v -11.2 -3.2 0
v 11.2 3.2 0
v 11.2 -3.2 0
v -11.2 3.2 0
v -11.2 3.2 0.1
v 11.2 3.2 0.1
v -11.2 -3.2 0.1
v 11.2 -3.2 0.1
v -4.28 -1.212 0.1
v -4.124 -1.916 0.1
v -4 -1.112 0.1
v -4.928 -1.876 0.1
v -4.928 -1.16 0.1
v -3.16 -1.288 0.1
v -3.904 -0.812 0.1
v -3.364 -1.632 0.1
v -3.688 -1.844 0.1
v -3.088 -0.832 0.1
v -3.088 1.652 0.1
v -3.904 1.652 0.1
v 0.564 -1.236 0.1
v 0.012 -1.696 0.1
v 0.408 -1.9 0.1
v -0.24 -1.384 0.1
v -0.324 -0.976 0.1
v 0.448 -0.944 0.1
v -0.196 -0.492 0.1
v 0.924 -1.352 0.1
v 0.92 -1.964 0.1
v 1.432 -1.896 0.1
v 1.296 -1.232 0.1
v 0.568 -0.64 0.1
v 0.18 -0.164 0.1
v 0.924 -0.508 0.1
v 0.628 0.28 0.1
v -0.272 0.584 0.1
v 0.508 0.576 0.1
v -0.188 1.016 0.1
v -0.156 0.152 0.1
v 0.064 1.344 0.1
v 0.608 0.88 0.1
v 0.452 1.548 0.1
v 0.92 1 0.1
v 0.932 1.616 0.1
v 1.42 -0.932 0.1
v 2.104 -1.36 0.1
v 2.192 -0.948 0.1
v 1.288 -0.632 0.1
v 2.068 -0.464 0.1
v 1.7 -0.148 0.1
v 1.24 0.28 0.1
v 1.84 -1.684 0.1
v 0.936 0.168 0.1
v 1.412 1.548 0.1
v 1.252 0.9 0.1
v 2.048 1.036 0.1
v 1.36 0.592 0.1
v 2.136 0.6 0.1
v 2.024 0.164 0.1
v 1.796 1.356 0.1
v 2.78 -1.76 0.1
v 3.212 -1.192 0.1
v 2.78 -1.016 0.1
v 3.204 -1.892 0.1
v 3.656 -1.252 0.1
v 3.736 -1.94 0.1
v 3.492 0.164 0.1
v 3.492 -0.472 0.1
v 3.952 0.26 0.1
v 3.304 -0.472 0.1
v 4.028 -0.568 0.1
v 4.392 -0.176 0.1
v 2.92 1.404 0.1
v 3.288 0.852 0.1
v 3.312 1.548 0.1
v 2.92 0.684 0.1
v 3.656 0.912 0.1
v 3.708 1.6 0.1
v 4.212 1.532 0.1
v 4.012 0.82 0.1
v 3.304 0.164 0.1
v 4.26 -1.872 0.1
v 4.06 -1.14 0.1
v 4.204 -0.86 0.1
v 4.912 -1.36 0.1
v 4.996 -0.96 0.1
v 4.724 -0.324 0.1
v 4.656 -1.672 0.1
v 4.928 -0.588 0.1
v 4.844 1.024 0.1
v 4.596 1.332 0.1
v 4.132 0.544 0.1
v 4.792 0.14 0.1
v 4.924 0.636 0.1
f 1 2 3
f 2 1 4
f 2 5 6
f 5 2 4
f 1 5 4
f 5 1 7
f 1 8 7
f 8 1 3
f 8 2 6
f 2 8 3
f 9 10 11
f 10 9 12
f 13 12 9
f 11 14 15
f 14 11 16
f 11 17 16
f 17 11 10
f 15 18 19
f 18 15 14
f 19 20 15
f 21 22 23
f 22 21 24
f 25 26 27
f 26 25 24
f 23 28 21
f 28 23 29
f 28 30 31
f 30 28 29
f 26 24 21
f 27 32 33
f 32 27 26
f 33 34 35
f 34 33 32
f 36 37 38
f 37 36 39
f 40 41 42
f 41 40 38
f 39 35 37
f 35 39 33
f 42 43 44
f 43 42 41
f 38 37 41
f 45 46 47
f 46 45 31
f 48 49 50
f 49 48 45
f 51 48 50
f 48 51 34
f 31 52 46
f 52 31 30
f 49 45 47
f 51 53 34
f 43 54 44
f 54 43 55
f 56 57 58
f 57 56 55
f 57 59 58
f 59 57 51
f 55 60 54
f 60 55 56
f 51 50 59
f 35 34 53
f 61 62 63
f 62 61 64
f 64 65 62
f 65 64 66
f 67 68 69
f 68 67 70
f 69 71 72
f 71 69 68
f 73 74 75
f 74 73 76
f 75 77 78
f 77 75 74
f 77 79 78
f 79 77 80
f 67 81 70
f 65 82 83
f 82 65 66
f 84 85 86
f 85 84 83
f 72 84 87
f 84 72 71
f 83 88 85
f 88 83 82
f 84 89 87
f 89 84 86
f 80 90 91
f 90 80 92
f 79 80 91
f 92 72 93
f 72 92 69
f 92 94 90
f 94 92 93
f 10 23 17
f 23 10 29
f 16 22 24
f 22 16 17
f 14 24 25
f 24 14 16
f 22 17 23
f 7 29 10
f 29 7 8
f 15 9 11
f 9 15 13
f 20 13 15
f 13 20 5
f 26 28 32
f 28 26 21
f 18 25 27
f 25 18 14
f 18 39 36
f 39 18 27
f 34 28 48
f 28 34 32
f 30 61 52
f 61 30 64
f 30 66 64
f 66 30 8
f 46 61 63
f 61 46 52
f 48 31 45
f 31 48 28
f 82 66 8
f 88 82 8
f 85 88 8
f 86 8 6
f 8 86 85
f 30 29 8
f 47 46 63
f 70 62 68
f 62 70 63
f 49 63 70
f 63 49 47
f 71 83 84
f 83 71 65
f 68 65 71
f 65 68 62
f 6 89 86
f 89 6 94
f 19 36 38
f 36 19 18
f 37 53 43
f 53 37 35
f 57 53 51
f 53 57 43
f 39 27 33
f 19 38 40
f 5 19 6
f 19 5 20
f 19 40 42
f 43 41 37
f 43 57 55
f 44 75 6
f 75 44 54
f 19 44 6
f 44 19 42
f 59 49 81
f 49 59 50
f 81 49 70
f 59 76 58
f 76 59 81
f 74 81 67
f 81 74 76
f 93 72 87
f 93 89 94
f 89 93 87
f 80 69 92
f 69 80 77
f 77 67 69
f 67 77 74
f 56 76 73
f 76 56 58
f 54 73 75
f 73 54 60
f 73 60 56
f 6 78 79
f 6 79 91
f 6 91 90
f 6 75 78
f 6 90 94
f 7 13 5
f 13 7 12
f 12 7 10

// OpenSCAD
// file: ../p/box5-12.scad
use <../lib.scad>
function ldraw_lib__box5_12() = [
// 0 Box with 5 Faces without Any Edges
// 0 Name: box5-12.dat
// 0 Author: Chris Dee [cwdee]
// 0 !LDRAW_ORG Primitive UPDATE 2009-02
// 0 !LICENSE Licensed under CC BY 2.0 and CC BY 4.0 : see CAreadme.txt
// 
// 0 BFC CERTIFY CCW
  [0,"BFC","CERTIFY"],
  [0,"BFC","CCW"],
// 
// 0 !HISTORY 2009-09-03 [PTadmin] Official Update 2009-02
// 
// 
// 4 16 1 1 1 1 1 -1 -1 1 -1 -1 1 1
  [4,16,1,1,1,1,1,-1,-1,1,-1,-1,1,1],
// 4 16 -1 0 1 1 0 1 1 1 1 -1 1 1
  [4,16,-1,0,1,1,0,1,1,1,1,-1,1,1],
// 4 16 -1 0 -1 -1 0 1 -1 1 1 -1 1 -1
  [4,16,-1,0,-1,-1,0,1,-1,1,1,-1,1,-1],
// 4 16 1 0 -1 -1 0 -1 -1 1 -1 1 1 -1
  [4,16,1,0,-1,-1,0,-1,-1,1,-1,1,1,-1],
// 4 16 1 0 1 1 0 -1 1 1 -1 1 1 1
  [4,16,1,0,1,1,0,-1,1,1,-1,1,1,1],
// 0
];
makepoly(ldraw_lib__box5_12(), line=0.2);
// main file
use <../lib.scad>
use <../p/box5-12.scad>
function ldraw_lib__6153754l() = [
// 0 Sticker  0.8 x  2.8 with Black "J 83" on Transparent Background
// 0 Name: 6153754l.dat
// 0 Author: Magnus Forsberg [MagFors]
// 0 !LDRAW_ORG Part UPDATE 2016-01
// 0 !LICENSE Licensed under CC BY 2.0 and CC BY 4.0 : see CAreadme.txt
// 
// 0 BFC CERTIFY CCW
  [0,"BFC","CERTIFY"],
  [0,"BFC","CCW"],
// 
// 0 !KEYWORDS Beetle, set 10252, Volkswagen, VW
// 
// 0 !HISTORY 2016-12-31 [PTadmin] Official Update 2016-01
// 
// 
// 1 16 0 -0.25 0 28 0 0 0 0.25 0 0 0 8 box5-12.dat
  [1,16,0,-0.25,0,28,0,0,0,0.25,0,0,0,8, ldraw_lib__box5_12()],
// 4 0 -10.7 -0.25 -3.03 -12.32 -0.25 -4.69 -10.31 -0.25 -4.79 -10 -0.25 -2.78
  [4,0,-10.7,-0.25,-3.03,-12.32,-0.25,-4.69,-10.31,-0.25,-4.79,-10,-0.25,-2.78],
// 3 0 -12.32 -0.25 -2.9 -12.32 -0.25 -4.69 -10.7 -0.25 -3.03
  [3,0,-12.32,-0.25,-2.9,-12.32,-0.25,-4.69,-10.7,-0.25,-3.03],
// 4 0 -7.9 -0.25 -3.22 -9.76 -0.25 -2.03 -10 -0.25 -2.78 -8.41 -0.25 -4.08
  [4,0,-7.9,-0.25,-3.22,-9.76,-0.25,-2.03,-10,-0.25,-2.78,-8.41,-0.25,-4.08],
// 4 0 -10 -0.25 -2.78 -10.31 -0.25 -4.79 -9.22 -0.25 -4.61 -8.41 -0.25 -4.08
  [4,0,-10,-0.25,-2.78,-10.31,-0.25,-4.79,-9.22,-0.25,-4.61,-8.41,-0.25,-4.08],
// 4 0 -9.76 -0.25 -2.03 -7.9 -0.25 -3.22 -7.72 -0.25 -2.08 -7.72 -0.25 4.13
  [4,0,-9.76,-0.25,-2.03,-7.9,-0.25,-3.22,-7.72,-0.25,-2.08,-7.72,-0.25,4.13],
// 3 0 -7.72 -0.25 4.13 -9.76 -0.25 4.13 -9.76 -0.25 -2.03
  [3,0,-7.72,-0.25,4.13,-9.76,-0.25,4.13,-9.76,-0.25,-2.03],
// 4 0 1.41 -0.25 -3.09 -0.6 -0.25 -3.46 0.03 -0.25 -4.24 1.02 -0.25 -4.75
  [4,0,1.41,-0.25,-3.09,-0.6,-0.25,-3.46,0.03,-0.25,-4.24,1.02,-0.25,-4.75],
// 4 0 -0.81 -0.25 -2.44 -0.6 -0.25 -3.46 1.12 -0.25 -2.36 -0.49 -0.25 -1.23
  [4,0,-0.81,-0.25,-2.44,-0.6,-0.25,-3.46,1.12,-0.25,-2.36,-0.49,-0.25,-1.23],
// 4 0 2.31 -0.25 -3.38 1.41 -0.25 -3.09 1.02 -0.25 -4.75 2.3 -0.25 -4.91
  [4,0,2.31,-0.25,-3.38,1.41,-0.25,-3.09,1.02,-0.25,-4.75,2.3,-0.25,-4.91],
// 4 0 2.31 -0.25 -3.38 2.3 -0.25 -4.91 3.58 -0.25 -4.74 3.24 -0.25 -3.08
  [4,0,2.31,-0.25,-3.38,2.3,-0.25,-4.91,3.58,-0.25,-4.74,3.24,-0.25,-3.08],
// 3 0 1.12 -0.25 -2.36 -0.6 -0.25 -3.46 1.41 -0.25 -3.09
  [3,0,1.12,-0.25,-2.36,-0.6,-0.25,-3.46,1.41,-0.25,-3.09],
// 4 0 -0.49 -0.25 -1.23 1.12 -0.25 -2.36 1.42 -0.25 -1.6 0.45 -0.25 -0.41
  [4,0,-0.49,-0.25,-1.23,1.12,-0.25,-2.36,1.42,-0.25,-1.6,0.45,-0.25,-0.41],
// 4 0 0.45 -0.25 -0.41 1.42 -0.25 -1.6 2.31 -0.25 -1.27 1.57 -0.25 0.7
  [4,0,0.45,-0.25,-0.41,1.42,-0.25,-1.6,2.31,-0.25,-1.27,1.57,-0.25,0.7],
// 4 0 -0.68 -0.25 1.46 -0.39 -0.25 0.38 1.27 -0.25 1.44 -0.47 -0.25 2.54
  [4,0,-0.68,-0.25,1.46,-0.39,-0.25,0.38,1.27,-0.25,1.44,-0.47,-0.25,2.54],
// 4 0 0.16 -0.25 3.36 -0.47 -0.25 2.54 1.52 -0.25 2.2 1.13 -0.25 3.87
  [4,0,0.16,-0.25,3.36,-0.47,-0.25,2.54,1.52,-0.25,2.2,1.13,-0.25,3.87],
// 4 0 -0.39 -0.25 0.38 0.45 -0.25 -0.41 1.57 -0.25 0.7 1.27 -0.25 1.44
  [4,0,-0.39,-0.25,0.38,0.45,-0.25,-0.41,1.57,-0.25,0.7,1.27,-0.25,1.44],
// 4 0 1.13 -0.25 3.87 1.52 -0.25 2.2 2.3 -0.25 2.5 2.33 -0.25 4.04
  [4,0,1.13,-0.25,3.87,1.52,-0.25,2.2,2.3,-0.25,2.5,2.33,-0.25,4.04],
// 3 0 -0.47 -0.25 2.54 1.27 -0.25 1.44 1.52 -0.25 2.2
  [3,0,-0.47,-0.25,2.54,1.27,-0.25,1.44,1.52,-0.25,2.2],
// 4 0 3.55 -0.25 -2.33 3.24 -0.25 -3.08 5.26 -0.25 -3.4 5.48 -0.25 -2.37
  [4,0,3.55,-0.25,-2.33,3.24,-0.25,-3.08,5.26,-0.25,-3.4,5.48,-0.25,-2.37],
// 4 0 3.22 -0.25 -1.58 3.55 -0.25 -2.33 5.17 -0.25 -1.16 4.25 -0.25 -0.37
  [4,0,3.22,-0.25,-1.58,3.55,-0.25,-2.33,5.17,-0.25,-1.16,4.25,-0.25,-0.37],
// 4 0 3.1 -0.25 0.7 2.31 -0.25 -1.27 3.22 -0.25 -1.58 4.25 -0.25 -0.37
  [4,0,3.1,-0.25,0.7,2.31,-0.25,-1.27,3.22,-0.25,-1.58,4.25,-0.25,-0.37],
// 4 0 3.24 -0.25 -3.08 3.58 -0.25 -4.74 4.6 -0.25 -4.21 5.26 -0.25 -3.4
  [4,0,3.24,-0.25,-3.08,3.58,-0.25,-4.74,4.6,-0.25,-4.21,5.26,-0.25,-3.4],
// 3 0 5.17 -0.25 -1.16 3.55 -0.25 -2.33 5.48 -0.25 -2.37
  [3,0,5.17,-0.25,-1.16,3.55,-0.25,-2.33,5.48,-0.25,-2.37],
// 3 0 3.1 -0.25 0.7 2.34 -0.25 0.42 2.31 -0.25 -1.27
  [3,0,3.1,-0.25,0.7,2.34,-0.25,0.42,2.31,-0.25,-1.27],
// 4 0 2.3 -0.25 2.5 3.13 -0.25 2.25 3.53 -0.25 3.87 2.33 -0.25 4.04
  [4,0,2.3,-0.25,2.5,3.13,-0.25,2.25,3.53,-0.25,3.87,2.33,-0.25,4.04],
// 4 0 5.12 -0.25 2.59 3.13 -0.25 2.25 3.4 -0.25 1.48 5.34 -0.25 1.5
  [4,0,5.12,-0.25,2.59,3.13,-0.25,2.25,3.4,-0.25,1.48,5.34,-0.25,1.5],
// 4 0 3.4 -0.25 1.48 3.1 -0.25 0.7 5.06 -0.25 0.41 5.34 -0.25 1.5
  [4,0,3.4,-0.25,1.48,3.1,-0.25,0.7,5.06,-0.25,0.41,5.34,-0.25,1.5],
// 4 0 4.49 -0.25 3.39 3.53 -0.25 3.87 3.13 -0.25 2.25 5.12 -0.25 2.59
  [4,0,4.49,-0.25,3.39,3.53,-0.25,3.87,3.13,-0.25,2.25,5.12,-0.25,2.59],
// 3 0 3.1 -0.25 0.7 4.25 -0.25 -0.37 5.06 -0.25 0.41
  [3,0,3.1,-0.25,0.7,4.25,-0.25,-0.37,5.06,-0.25,0.41],
// 3 0 1.57 -0.25 0.7 2.31 -0.25 -1.27 2.34 -0.25 0.42
  [3,0,1.57,-0.25,0.7,2.31,-0.25,-1.27,2.34,-0.25,0.42],
// 4 0 6.95 -0.25 -4.4 8.01 -0.25 -4.73 8.03 -0.25 -2.98 6.95 -0.25 -2.54
  [4,0,6.95,-0.25,-4.4,8.01,-0.25,-4.73,8.03,-0.25,-2.98,6.95,-0.25,-2.54],
// 4 0 9.14 -0.25 -3.13 8.03 -0.25 -2.98 8.01 -0.25 -4.73 9.34 -0.25 -4.85
  [4,0,9.14,-0.25,-3.13,8.03,-0.25,-2.98,8.01,-0.25,-4.73,9.34,-0.25,-4.85],
// 4 0 8.73 -0.25 0.41 8.26 -0.25 -1.18 8.73 -0.25 -1.18 9.88 -0.25 0.65
  [4,0,8.73,-0.25,0.41,8.26,-0.25,-1.18,8.73,-0.25,-1.18,9.88,-0.25,0.65],
// 4 0 9.88 -0.25 0.65 8.73 -0.25 -1.18 10.07 -0.25 -1.42 10.98 -0.25 -0.44
  [4,0,9.88,-0.25,0.65,8.73,-0.25,-1.18,10.07,-0.25,-1.42,10.98,-0.25,-0.44],
// 4 0 8.22 -0.25 2.13 8.28 -0.25 3.87 7.3 -0.25 3.51 7.3 -0.25 1.71
  [4,0,8.22,-0.25,2.13,8.28,-0.25,3.87,7.3,-0.25,3.51,7.3,-0.25,1.71],
// 4 0 9.14 -0.25 2.28 9.27 -0.25 4 8.28 -0.25 3.87 8.22 -0.25 2.13
  [4,0,9.14,-0.25,2.28,9.27,-0.25,4,8.28,-0.25,3.87,8.22,-0.25,2.13],
// 4 0 10.53 -0.25 3.83 9.27 -0.25 4 9.14 -0.25 2.28 10.03 -0.25 2.05
  [4,0,10.53,-0.25,3.83,9.27,-0.25,4,9.14,-0.25,2.28,10.03,-0.25,2.05],
// 3 0 8.73 -0.25 0.41 8.26 -0.25 0.41 8.26 -0.25 -1.18
  [3,0,8.73,-0.25,0.41,8.26,-0.25,0.41,8.26,-0.25,-1.18],
// 4 0 9.14 -0.25 -3.13 9.34 -0.25 -4.85 10.65 -0.25 -4.68 10.15 -0.25 -2.85
  [4,0,9.14,-0.25,-3.13,9.34,-0.25,-4.85,10.65,-0.25,-4.68,10.15,-0.25,-2.85],
// 4 0 10.51 -0.25 -2.15 10.15 -0.25 -2.85 12.28 -0.25 -3.4 12.49 -0.25 -2.4
  [4,0,10.51,-0.25,-2.15,10.15,-0.25,-2.85,12.28,-0.25,-3.4,12.49,-0.25,-2.4],
// 4 0 10.98 -0.25 -0.44 10.07 -0.25 -1.42 10.51 -0.25 -2.15 11.81 -0.25 -0.81
  [4,0,10.98,-0.25,-0.44,10.07,-0.25,-1.42,10.51,-0.25,-2.15,11.81,-0.25,-0.81],
// 4 0 10.15 -0.25 -2.85 10.65 -0.25 -4.68 11.64 -0.25 -4.18 12.28 -0.25 -3.4
  [4,0,10.15,-0.25,-2.85,10.65,-0.25,-4.68,11.64,-0.25,-4.18,12.28,-0.25,-3.4],
// 4 0 10.51 -0.25 -2.15 12.49 -0.25 -2.4 12.32 -0.25 -1.47 11.81 -0.25 -0.81
  [4,0,10.51,-0.25,-2.15,12.49,-0.25,-2.4,12.32,-0.25,-1.47,11.81,-0.25,-0.81],
// 4 0 10.03 -0.25 2.05 10.33 -0.25 1.36 12.11 -0.25 2.56 11.49 -0.25 3.33
  [4,0,10.03,-0.25,2.05,10.33,-0.25,1.36,12.11,-0.25,2.56,11.49,-0.25,3.33],
// 3 0 10.53 -0.25 3.83 10.03 -0.25 2.05 11.49 -0.25 3.33
  [3,0,10.53,-0.25,3.83,10.03,-0.25,2.05,11.49,-0.25,3.33],
// 4 0 10.98 -0.25 -0.44 11.98 -0.25 0.35 10.33 -0.25 1.36 9.88 -0.25 0.65
  [4,0,10.98,-0.25,-0.44,11.98,-0.25,0.35,10.33,-0.25,1.36,9.88,-0.25,0.65],
// 4 0 10.33 -0.25 1.36 11.98 -0.25 0.35 12.31 -0.25 1.59 12.11 -0.25 2.56
  [4,0,10.33,-0.25,1.36,11.98,-0.25,0.35,12.31,-0.25,1.59,12.11,-0.25,2.56],
// 4 16 1.02 -0.25 -4.75 -9.22 -0.25 -4.61 -10.31 -0.25 -4.79 2.3 -0.25 -4.91
  [4,16,1.02,-0.25,-4.75,-9.22,-0.25,-4.61,-10.31,-0.25,-4.79,2.3,-0.25,-4.91],
// 4 16 -8.41 -0.25 -4.08 -9.22 -0.25 -4.61 0.03 -0.25 -4.24 -0.6 -0.25 -3.46
  [4,16,-8.41,-0.25,-4.08,-9.22,-0.25,-4.61,0.03,-0.25,-4.24,-0.6,-0.25,-3.46],
// 4 16 -0.6 -0.25 -3.46 -0.81 -0.25 -2.44 -7.9 -0.25 -3.22 -8.41 -0.25 -4.08
  [4,16,-0.6,-0.25,-3.46,-0.81,-0.25,-2.44,-7.9,-0.25,-3.22,-8.41,-0.25,-4.08],
// 3 16 0.03 -0.25 -4.24 -9.22 -0.25 -4.61 1.02 -0.25 -4.75
  [3,16,0.03,-0.25,-4.24,-9.22,-0.25,-4.61,1.02,-0.25,-4.75],
// 4 16 28 -0.25 -8 2.3 -0.25 -4.91 -10.31 -0.25 -4.79 -28 -0.25 -8
  [4,16,28,-0.25,-8,2.3,-0.25,-4.91,-10.31,-0.25,-4.79,-28,-0.25,-8],
// 4 16 -9.76 -0.25 -2.03 -12.32 -0.25 -2.9 -10.7 -0.25 -3.03 -10 -0.25 -2.78
  [4,16,-9.76,-0.25,-2.03,-12.32,-0.25,-2.9,-10.7,-0.25,-3.03,-10,-0.25,-2.78],
// 4 16 -12.32 -0.25 -2.9 -9.76 -0.25 -2.03 -9.76 -0.25 4.13 -28 -0.25 8
  [4,16,-12.32,-0.25,-2.9,-9.76,-0.25,-2.03,-9.76,-0.25,4.13,-28,-0.25,8],
// 4 16 1.12 -0.25 -2.36 1.41 -0.25 -3.09 2.31 -0.25 -3.38 1.42 -0.25 -1.6
  [4,16,1.12,-0.25,-2.36,1.41,-0.25,-3.09,2.31,-0.25,-3.38,1.42,-0.25,-1.6],
// 4 16 -0.81 -0.25 -2.44 -0.49 -0.25 -1.23 -7.72 -0.25 -2.08 -7.9 -0.25 -3.22
  [4,16,-0.81,-0.25,-2.44,-0.49,-0.25,-1.23,-7.72,-0.25,-2.08,-7.9,-0.25,-3.22],
// 4 16 -7.72 -0.25 -2.08 -0.49 -0.25 -1.23 -0.39 -0.25 0.38 -0.68 -0.25 1.46
  [4,16,-7.72,-0.25,-2.08,-0.49,-0.25,-1.23,-0.39,-0.25,0.38,-0.68,-0.25,1.46],
// 4 16 2.31 -0.25 -1.27 1.42 -0.25 -1.6 2.31 -0.25 -3.38 3.22 -0.25 -1.58
  [4,16,2.31,-0.25,-1.27,1.42,-0.25,-1.6,2.31,-0.25,-3.38,3.22,-0.25,-1.58],
// 4 16 3.58 -0.25 -4.74 8.01 -0.25 -4.73 6.95 -0.25 -4.4 4.6 -0.25 -4.21
  [4,16,3.58,-0.25,-4.74,8.01,-0.25,-4.73,6.95,-0.25,-4.4,4.6,-0.25,-4.21],
// 4 16 8.01 -0.25 -4.73 3.58 -0.25 -4.74 28 -0.25 -8 9.34 -0.25 -4.85
  [4,16,8.01,-0.25,-4.73,3.58,-0.25,-4.74,28,-0.25,-8,9.34,-0.25,-4.85],
// 4 16 6.95 -0.25 -4.4 6.95 -0.25 -2.54 5.26 -0.25 -3.4 4.6 -0.25 -4.21
  [4,16,6.95,-0.25,-4.4,6.95,-0.25,-2.54,5.26,-0.25,-3.4,4.6,-0.25,-4.21],
// 4 16 3.22 -0.25 -1.58 2.31 -0.25 -3.38 3.24 -0.25 -3.08 3.55 -0.25 -2.33
  [4,16,3.22,-0.25,-1.58,2.31,-0.25,-3.38,3.24,-0.25,-3.08,3.55,-0.25,-2.33],
// 3 16 10.65 -0.25 -4.68 9.34 -0.25 -4.85 28 -0.25 -8
  [3,16,10.65,-0.25,-4.68,9.34,-0.25,-4.85,28,-0.25,-8],
// 3 16 11.64 -0.25 -4.18 10.65 -0.25 -4.68 28 -0.25 -8
  [3,16,11.64,-0.25,-4.18,10.65,-0.25,-4.68,28,-0.25,-8],
// 3 16 12.28 -0.25 -3.4 11.64 -0.25 -4.18 28 -0.25 -8
  [3,16,12.28,-0.25,-3.4,11.64,-0.25,-4.18,28,-0.25,-8],
// 4 16 12.49 -0.25 -2.4 12.28 -0.25 -3.4 28 -0.25 -8 28 -0.25 8
  [4,16,12.49,-0.25,-2.4,12.28,-0.25,-3.4,28,-0.25,-8,28,-0.25,8],
// 3 16 3.58 -0.25 -4.74 2.3 -0.25 -4.91 28 -0.25 -8
  [3,16,3.58,-0.25,-4.74,2.3,-0.25,-4.91,28,-0.25,-8],
// 3 16 5.48 -0.25 -2.37 5.26 -0.25 -3.4 6.95 -0.25 -2.54
  [3,16,5.48,-0.25,-2.37,5.26,-0.25,-3.4,6.95,-0.25,-2.54],
// 4 16 8.26 -0.25 -1.18 6.95 -0.25 -2.54 8.03 -0.25 -2.98 8.73 -0.25 -1.18
  [4,16,8.26,-0.25,-1.18,6.95,-0.25,-2.54,8.03,-0.25,-2.98,8.73,-0.25,-1.18],
// 4 16 5.17 -0.25 -1.16 5.48 -0.25 -2.37 6.95 -0.25 -2.54 8.26 -0.25 -1.18
  [4,16,5.17,-0.25,-1.16,5.48,-0.25,-2.37,6.95,-0.25,-2.54,8.26,-0.25,-1.18],
// 4 16 10.15 -0.25 -2.85 10.51 -0.25 -2.15 10.07 -0.25 -1.42 9.14 -0.25 -3.13
  [4,16,10.15,-0.25,-2.85,10.51,-0.25,-2.15,10.07,-0.25,-1.42,9.14,-0.25,-3.13],
// 4 16 9.14 -0.25 -3.13 10.07 -0.25 -1.42 8.73 -0.25 -1.18 8.03 -0.25 -2.98
  [4,16,9.14,-0.25,-3.13,10.07,-0.25,-1.42,8.73,-0.25,-1.18,8.03,-0.25,-2.98],
// 4 16 12.31 -0.25 1.59 12.32 -0.25 -1.47 12.49 -0.25 -2.4 28 -0.25 8
  [4,16,12.31,-0.25,1.59,12.32,-0.25,-1.47,12.49,-0.25,-2.4,28,-0.25,8],
// 4 16 -7.72 -0.25 4.13 -7.72 -0.25 -2.08 -0.68 -0.25 1.46 -0.47 -0.25 2.54
  [4,16,-7.72,-0.25,4.13,-7.72,-0.25,-2.08,-0.68,-0.25,1.46,-0.47,-0.25,2.54],
// 4 16 1.27 -0.25 1.44 1.57 -0.25 0.7 2.34 -0.25 0.42 2.3 -0.25 2.5
  [4,16,1.27,-0.25,1.44,1.57,-0.25,0.7,2.34,-0.25,0.42,2.3,-0.25,2.5],
// 4 16 2.34 -0.25 0.42 3.1 -0.25 0.7 3.4 -0.25 1.48 2.3 -0.25 2.5
  [4,16,2.34,-0.25,0.42,3.1,-0.25,0.7,3.4,-0.25,1.48,2.3,-0.25,2.5],
// 3 16 -0.39 -0.25 0.38 -0.49 -0.25 -1.23 0.45 -0.25 -0.41
  [3,16,-0.39,-0.25,0.38,-0.49,-0.25,-1.23,0.45,-0.25,-0.41],
// 3 16 -7.72 -0.25 4.13 -0.47 -0.25 2.54 0.16 -0.25 3.36
  [3,16,-7.72,-0.25,4.13,-0.47,-0.25,2.54,0.16,-0.25,3.36],
// 4 16 -9.76 -0.25 4.13 -7.72 -0.25 4.13 28 -0.25 8 -28 -0.25 8
  [4,16,-9.76,-0.25,4.13,-7.72,-0.25,4.13,28,-0.25,8,-28,-0.25,8],
// 3 16 -7.72 -0.25 4.13 0.16 -0.25 3.36 1.13 -0.25 3.87
  [3,16,-7.72,-0.25,4.13,0.16,-0.25,3.36,1.13,-0.25,3.87],
// 3 16 2.3 -0.25 2.5 1.52 -0.25 2.2 1.27 -0.25 1.44
  [3,16,2.3,-0.25,2.5,1.52,-0.25,2.2,1.27,-0.25,1.44],
// 3 16 2.3 -0.25 2.5 3.4 -0.25 1.48 3.13 -0.25 2.25
  [3,16,2.3,-0.25,2.5,3.4,-0.25,1.48,3.13,-0.25,2.25],
// 4 16 28 -0.25 8 2.33 -0.25 4.04 3.53 -0.25 3.87 8.28 -0.25 3.87
  [4,16,28,-0.25,8,2.33,-0.25,4.04,3.53,-0.25,3.87,8.28,-0.25,3.87],
// 4 16 -7.72 -0.25 4.13 1.13 -0.25 3.87 2.33 -0.25 4.04 28 -0.25 8
  [4,16,-7.72,-0.25,4.13,1.13,-0.25,3.87,2.33,-0.25,4.04,28,-0.25,8],
// 4 16 5.06 -0.25 0.41 4.25 -0.25 -0.37 5.17 -0.25 -1.16 8.26 -0.25 0.41
  [4,16,5.06,-0.25,0.41,4.25,-0.25,-0.37,5.17,-0.25,-1.16,8.26,-0.25,0.41],
// 3 16 8.26 -0.25 0.41 5.17 -0.25 -1.16 8.26 -0.25 -1.18
  [3,16,8.26,-0.25,0.41,5.17,-0.25,-1.16,8.26,-0.25,-1.18],
// 4 16 7.3 -0.25 1.71 5.34 -0.25 1.5 5.06 -0.25 0.41 8.26 -0.25 0.41
  [4,16,7.3,-0.25,1.71,5.34,-0.25,1.5,5.06,-0.25,0.41,8.26,-0.25,0.41],
// 4 16 8.26 -0.25 0.41 8.73 -0.25 0.41 8.22 -0.25 2.13 7.3 -0.25 1.71
  [4,16,8.26,-0.25,0.41,8.73,-0.25,0.41,8.22,-0.25,2.13,7.3,-0.25,1.71],
// 3 16 11.98 -0.25 0.35 10.98 -0.25 -0.44 11.81 -0.25 -0.81
  [3,16,11.98,-0.25,0.35,10.98,-0.25,-0.44,11.81,-0.25,-0.81],
// 4 16 11.98 -0.25 0.35 11.81 -0.25 -0.81 12.32 -0.25 -1.47 12.31 -0.25 1.59
  [4,16,11.98,-0.25,0.35,11.81,-0.25,-0.81,12.32,-0.25,-1.47,12.31,-0.25,1.59],
// 4 16 9.88 -0.25 0.65 10.33 -0.25 1.36 10.03 -0.25 2.05 9.14 -0.25 2.28
  [4,16,9.88,-0.25,0.65,10.33,-0.25,1.36,10.03,-0.25,2.05,9.14,-0.25,2.28],
// 4 16 8.73 -0.25 0.41 9.88 -0.25 0.65 9.14 -0.25 2.28 8.22 -0.25 2.13
  [4,16,8.73,-0.25,0.41,9.88,-0.25,0.65,9.14,-0.25,2.28,8.22,-0.25,2.13],
// 4 16 7.3 -0.25 1.71 7.3 -0.25 3.51 5.12 -0.25 2.59 5.34 -0.25 1.5
  [4,16,7.3,-0.25,1.71,7.3,-0.25,3.51,5.12,-0.25,2.59,5.34,-0.25,1.5],
// 4 16 7.3 -0.25 3.51 8.28 -0.25 3.87 3.53 -0.25 3.87 4.49 -0.25 3.39
  [4,16,7.3,-0.25,3.51,8.28,-0.25,3.87,3.53,-0.25,3.87,4.49,-0.25,3.39],
// 3 16 7.3 -0.25 3.51 4.49 -0.25 3.39 5.12 -0.25 2.59
  [3,16,7.3,-0.25,3.51,4.49,-0.25,3.39,5.12,-0.25,2.59],
// 3 16 28 -0.25 8 9.27 -0.25 4 10.53 -0.25 3.83
  [3,16,28,-0.25,8,9.27,-0.25,4,10.53,-0.25,3.83],
// 3 16 28 -0.25 8 10.53 -0.25 3.83 11.49 -0.25 3.33
  [3,16,28,-0.25,8,10.53,-0.25,3.83,11.49,-0.25,3.33],
// 3 16 28 -0.25 8 11.49 -0.25 3.33 12.11 -0.25 2.56
  [3,16,28,-0.25,8,11.49,-0.25,3.33,12.11,-0.25,2.56],
// 3 16 28 -0.25 8 8.28 -0.25 3.87 9.27 -0.25 4
  [3,16,28,-0.25,8,8.28,-0.25,3.87,9.27,-0.25,4],
// 3 16 28 -0.25 8 12.11 -0.25 2.56 12.31 -0.25 1.59
  [3,16,28,-0.25,8,12.11,-0.25,2.56,12.31,-0.25,1.59],
// 4 16 -28 -0.25 -8 -12.32 -0.25 -4.69 -12.32 -0.25 -2.9 -28 -0.25 8
  [4,16,-28,-0.25,-8,-12.32,-0.25,-4.69,-12.32,-0.25,-2.9,-28,-0.25,8],
// 3 16 -12.32 -0.25 -4.69 -28 -0.25 -8 -10.31 -0.25 -4.79
  [3,16,-12.32,-0.25,-4.69,-28,-0.25,-8,-10.31,-0.25,-4.79],
];
makepoly(ldraw_lib__6153754l(), line=0.2);
